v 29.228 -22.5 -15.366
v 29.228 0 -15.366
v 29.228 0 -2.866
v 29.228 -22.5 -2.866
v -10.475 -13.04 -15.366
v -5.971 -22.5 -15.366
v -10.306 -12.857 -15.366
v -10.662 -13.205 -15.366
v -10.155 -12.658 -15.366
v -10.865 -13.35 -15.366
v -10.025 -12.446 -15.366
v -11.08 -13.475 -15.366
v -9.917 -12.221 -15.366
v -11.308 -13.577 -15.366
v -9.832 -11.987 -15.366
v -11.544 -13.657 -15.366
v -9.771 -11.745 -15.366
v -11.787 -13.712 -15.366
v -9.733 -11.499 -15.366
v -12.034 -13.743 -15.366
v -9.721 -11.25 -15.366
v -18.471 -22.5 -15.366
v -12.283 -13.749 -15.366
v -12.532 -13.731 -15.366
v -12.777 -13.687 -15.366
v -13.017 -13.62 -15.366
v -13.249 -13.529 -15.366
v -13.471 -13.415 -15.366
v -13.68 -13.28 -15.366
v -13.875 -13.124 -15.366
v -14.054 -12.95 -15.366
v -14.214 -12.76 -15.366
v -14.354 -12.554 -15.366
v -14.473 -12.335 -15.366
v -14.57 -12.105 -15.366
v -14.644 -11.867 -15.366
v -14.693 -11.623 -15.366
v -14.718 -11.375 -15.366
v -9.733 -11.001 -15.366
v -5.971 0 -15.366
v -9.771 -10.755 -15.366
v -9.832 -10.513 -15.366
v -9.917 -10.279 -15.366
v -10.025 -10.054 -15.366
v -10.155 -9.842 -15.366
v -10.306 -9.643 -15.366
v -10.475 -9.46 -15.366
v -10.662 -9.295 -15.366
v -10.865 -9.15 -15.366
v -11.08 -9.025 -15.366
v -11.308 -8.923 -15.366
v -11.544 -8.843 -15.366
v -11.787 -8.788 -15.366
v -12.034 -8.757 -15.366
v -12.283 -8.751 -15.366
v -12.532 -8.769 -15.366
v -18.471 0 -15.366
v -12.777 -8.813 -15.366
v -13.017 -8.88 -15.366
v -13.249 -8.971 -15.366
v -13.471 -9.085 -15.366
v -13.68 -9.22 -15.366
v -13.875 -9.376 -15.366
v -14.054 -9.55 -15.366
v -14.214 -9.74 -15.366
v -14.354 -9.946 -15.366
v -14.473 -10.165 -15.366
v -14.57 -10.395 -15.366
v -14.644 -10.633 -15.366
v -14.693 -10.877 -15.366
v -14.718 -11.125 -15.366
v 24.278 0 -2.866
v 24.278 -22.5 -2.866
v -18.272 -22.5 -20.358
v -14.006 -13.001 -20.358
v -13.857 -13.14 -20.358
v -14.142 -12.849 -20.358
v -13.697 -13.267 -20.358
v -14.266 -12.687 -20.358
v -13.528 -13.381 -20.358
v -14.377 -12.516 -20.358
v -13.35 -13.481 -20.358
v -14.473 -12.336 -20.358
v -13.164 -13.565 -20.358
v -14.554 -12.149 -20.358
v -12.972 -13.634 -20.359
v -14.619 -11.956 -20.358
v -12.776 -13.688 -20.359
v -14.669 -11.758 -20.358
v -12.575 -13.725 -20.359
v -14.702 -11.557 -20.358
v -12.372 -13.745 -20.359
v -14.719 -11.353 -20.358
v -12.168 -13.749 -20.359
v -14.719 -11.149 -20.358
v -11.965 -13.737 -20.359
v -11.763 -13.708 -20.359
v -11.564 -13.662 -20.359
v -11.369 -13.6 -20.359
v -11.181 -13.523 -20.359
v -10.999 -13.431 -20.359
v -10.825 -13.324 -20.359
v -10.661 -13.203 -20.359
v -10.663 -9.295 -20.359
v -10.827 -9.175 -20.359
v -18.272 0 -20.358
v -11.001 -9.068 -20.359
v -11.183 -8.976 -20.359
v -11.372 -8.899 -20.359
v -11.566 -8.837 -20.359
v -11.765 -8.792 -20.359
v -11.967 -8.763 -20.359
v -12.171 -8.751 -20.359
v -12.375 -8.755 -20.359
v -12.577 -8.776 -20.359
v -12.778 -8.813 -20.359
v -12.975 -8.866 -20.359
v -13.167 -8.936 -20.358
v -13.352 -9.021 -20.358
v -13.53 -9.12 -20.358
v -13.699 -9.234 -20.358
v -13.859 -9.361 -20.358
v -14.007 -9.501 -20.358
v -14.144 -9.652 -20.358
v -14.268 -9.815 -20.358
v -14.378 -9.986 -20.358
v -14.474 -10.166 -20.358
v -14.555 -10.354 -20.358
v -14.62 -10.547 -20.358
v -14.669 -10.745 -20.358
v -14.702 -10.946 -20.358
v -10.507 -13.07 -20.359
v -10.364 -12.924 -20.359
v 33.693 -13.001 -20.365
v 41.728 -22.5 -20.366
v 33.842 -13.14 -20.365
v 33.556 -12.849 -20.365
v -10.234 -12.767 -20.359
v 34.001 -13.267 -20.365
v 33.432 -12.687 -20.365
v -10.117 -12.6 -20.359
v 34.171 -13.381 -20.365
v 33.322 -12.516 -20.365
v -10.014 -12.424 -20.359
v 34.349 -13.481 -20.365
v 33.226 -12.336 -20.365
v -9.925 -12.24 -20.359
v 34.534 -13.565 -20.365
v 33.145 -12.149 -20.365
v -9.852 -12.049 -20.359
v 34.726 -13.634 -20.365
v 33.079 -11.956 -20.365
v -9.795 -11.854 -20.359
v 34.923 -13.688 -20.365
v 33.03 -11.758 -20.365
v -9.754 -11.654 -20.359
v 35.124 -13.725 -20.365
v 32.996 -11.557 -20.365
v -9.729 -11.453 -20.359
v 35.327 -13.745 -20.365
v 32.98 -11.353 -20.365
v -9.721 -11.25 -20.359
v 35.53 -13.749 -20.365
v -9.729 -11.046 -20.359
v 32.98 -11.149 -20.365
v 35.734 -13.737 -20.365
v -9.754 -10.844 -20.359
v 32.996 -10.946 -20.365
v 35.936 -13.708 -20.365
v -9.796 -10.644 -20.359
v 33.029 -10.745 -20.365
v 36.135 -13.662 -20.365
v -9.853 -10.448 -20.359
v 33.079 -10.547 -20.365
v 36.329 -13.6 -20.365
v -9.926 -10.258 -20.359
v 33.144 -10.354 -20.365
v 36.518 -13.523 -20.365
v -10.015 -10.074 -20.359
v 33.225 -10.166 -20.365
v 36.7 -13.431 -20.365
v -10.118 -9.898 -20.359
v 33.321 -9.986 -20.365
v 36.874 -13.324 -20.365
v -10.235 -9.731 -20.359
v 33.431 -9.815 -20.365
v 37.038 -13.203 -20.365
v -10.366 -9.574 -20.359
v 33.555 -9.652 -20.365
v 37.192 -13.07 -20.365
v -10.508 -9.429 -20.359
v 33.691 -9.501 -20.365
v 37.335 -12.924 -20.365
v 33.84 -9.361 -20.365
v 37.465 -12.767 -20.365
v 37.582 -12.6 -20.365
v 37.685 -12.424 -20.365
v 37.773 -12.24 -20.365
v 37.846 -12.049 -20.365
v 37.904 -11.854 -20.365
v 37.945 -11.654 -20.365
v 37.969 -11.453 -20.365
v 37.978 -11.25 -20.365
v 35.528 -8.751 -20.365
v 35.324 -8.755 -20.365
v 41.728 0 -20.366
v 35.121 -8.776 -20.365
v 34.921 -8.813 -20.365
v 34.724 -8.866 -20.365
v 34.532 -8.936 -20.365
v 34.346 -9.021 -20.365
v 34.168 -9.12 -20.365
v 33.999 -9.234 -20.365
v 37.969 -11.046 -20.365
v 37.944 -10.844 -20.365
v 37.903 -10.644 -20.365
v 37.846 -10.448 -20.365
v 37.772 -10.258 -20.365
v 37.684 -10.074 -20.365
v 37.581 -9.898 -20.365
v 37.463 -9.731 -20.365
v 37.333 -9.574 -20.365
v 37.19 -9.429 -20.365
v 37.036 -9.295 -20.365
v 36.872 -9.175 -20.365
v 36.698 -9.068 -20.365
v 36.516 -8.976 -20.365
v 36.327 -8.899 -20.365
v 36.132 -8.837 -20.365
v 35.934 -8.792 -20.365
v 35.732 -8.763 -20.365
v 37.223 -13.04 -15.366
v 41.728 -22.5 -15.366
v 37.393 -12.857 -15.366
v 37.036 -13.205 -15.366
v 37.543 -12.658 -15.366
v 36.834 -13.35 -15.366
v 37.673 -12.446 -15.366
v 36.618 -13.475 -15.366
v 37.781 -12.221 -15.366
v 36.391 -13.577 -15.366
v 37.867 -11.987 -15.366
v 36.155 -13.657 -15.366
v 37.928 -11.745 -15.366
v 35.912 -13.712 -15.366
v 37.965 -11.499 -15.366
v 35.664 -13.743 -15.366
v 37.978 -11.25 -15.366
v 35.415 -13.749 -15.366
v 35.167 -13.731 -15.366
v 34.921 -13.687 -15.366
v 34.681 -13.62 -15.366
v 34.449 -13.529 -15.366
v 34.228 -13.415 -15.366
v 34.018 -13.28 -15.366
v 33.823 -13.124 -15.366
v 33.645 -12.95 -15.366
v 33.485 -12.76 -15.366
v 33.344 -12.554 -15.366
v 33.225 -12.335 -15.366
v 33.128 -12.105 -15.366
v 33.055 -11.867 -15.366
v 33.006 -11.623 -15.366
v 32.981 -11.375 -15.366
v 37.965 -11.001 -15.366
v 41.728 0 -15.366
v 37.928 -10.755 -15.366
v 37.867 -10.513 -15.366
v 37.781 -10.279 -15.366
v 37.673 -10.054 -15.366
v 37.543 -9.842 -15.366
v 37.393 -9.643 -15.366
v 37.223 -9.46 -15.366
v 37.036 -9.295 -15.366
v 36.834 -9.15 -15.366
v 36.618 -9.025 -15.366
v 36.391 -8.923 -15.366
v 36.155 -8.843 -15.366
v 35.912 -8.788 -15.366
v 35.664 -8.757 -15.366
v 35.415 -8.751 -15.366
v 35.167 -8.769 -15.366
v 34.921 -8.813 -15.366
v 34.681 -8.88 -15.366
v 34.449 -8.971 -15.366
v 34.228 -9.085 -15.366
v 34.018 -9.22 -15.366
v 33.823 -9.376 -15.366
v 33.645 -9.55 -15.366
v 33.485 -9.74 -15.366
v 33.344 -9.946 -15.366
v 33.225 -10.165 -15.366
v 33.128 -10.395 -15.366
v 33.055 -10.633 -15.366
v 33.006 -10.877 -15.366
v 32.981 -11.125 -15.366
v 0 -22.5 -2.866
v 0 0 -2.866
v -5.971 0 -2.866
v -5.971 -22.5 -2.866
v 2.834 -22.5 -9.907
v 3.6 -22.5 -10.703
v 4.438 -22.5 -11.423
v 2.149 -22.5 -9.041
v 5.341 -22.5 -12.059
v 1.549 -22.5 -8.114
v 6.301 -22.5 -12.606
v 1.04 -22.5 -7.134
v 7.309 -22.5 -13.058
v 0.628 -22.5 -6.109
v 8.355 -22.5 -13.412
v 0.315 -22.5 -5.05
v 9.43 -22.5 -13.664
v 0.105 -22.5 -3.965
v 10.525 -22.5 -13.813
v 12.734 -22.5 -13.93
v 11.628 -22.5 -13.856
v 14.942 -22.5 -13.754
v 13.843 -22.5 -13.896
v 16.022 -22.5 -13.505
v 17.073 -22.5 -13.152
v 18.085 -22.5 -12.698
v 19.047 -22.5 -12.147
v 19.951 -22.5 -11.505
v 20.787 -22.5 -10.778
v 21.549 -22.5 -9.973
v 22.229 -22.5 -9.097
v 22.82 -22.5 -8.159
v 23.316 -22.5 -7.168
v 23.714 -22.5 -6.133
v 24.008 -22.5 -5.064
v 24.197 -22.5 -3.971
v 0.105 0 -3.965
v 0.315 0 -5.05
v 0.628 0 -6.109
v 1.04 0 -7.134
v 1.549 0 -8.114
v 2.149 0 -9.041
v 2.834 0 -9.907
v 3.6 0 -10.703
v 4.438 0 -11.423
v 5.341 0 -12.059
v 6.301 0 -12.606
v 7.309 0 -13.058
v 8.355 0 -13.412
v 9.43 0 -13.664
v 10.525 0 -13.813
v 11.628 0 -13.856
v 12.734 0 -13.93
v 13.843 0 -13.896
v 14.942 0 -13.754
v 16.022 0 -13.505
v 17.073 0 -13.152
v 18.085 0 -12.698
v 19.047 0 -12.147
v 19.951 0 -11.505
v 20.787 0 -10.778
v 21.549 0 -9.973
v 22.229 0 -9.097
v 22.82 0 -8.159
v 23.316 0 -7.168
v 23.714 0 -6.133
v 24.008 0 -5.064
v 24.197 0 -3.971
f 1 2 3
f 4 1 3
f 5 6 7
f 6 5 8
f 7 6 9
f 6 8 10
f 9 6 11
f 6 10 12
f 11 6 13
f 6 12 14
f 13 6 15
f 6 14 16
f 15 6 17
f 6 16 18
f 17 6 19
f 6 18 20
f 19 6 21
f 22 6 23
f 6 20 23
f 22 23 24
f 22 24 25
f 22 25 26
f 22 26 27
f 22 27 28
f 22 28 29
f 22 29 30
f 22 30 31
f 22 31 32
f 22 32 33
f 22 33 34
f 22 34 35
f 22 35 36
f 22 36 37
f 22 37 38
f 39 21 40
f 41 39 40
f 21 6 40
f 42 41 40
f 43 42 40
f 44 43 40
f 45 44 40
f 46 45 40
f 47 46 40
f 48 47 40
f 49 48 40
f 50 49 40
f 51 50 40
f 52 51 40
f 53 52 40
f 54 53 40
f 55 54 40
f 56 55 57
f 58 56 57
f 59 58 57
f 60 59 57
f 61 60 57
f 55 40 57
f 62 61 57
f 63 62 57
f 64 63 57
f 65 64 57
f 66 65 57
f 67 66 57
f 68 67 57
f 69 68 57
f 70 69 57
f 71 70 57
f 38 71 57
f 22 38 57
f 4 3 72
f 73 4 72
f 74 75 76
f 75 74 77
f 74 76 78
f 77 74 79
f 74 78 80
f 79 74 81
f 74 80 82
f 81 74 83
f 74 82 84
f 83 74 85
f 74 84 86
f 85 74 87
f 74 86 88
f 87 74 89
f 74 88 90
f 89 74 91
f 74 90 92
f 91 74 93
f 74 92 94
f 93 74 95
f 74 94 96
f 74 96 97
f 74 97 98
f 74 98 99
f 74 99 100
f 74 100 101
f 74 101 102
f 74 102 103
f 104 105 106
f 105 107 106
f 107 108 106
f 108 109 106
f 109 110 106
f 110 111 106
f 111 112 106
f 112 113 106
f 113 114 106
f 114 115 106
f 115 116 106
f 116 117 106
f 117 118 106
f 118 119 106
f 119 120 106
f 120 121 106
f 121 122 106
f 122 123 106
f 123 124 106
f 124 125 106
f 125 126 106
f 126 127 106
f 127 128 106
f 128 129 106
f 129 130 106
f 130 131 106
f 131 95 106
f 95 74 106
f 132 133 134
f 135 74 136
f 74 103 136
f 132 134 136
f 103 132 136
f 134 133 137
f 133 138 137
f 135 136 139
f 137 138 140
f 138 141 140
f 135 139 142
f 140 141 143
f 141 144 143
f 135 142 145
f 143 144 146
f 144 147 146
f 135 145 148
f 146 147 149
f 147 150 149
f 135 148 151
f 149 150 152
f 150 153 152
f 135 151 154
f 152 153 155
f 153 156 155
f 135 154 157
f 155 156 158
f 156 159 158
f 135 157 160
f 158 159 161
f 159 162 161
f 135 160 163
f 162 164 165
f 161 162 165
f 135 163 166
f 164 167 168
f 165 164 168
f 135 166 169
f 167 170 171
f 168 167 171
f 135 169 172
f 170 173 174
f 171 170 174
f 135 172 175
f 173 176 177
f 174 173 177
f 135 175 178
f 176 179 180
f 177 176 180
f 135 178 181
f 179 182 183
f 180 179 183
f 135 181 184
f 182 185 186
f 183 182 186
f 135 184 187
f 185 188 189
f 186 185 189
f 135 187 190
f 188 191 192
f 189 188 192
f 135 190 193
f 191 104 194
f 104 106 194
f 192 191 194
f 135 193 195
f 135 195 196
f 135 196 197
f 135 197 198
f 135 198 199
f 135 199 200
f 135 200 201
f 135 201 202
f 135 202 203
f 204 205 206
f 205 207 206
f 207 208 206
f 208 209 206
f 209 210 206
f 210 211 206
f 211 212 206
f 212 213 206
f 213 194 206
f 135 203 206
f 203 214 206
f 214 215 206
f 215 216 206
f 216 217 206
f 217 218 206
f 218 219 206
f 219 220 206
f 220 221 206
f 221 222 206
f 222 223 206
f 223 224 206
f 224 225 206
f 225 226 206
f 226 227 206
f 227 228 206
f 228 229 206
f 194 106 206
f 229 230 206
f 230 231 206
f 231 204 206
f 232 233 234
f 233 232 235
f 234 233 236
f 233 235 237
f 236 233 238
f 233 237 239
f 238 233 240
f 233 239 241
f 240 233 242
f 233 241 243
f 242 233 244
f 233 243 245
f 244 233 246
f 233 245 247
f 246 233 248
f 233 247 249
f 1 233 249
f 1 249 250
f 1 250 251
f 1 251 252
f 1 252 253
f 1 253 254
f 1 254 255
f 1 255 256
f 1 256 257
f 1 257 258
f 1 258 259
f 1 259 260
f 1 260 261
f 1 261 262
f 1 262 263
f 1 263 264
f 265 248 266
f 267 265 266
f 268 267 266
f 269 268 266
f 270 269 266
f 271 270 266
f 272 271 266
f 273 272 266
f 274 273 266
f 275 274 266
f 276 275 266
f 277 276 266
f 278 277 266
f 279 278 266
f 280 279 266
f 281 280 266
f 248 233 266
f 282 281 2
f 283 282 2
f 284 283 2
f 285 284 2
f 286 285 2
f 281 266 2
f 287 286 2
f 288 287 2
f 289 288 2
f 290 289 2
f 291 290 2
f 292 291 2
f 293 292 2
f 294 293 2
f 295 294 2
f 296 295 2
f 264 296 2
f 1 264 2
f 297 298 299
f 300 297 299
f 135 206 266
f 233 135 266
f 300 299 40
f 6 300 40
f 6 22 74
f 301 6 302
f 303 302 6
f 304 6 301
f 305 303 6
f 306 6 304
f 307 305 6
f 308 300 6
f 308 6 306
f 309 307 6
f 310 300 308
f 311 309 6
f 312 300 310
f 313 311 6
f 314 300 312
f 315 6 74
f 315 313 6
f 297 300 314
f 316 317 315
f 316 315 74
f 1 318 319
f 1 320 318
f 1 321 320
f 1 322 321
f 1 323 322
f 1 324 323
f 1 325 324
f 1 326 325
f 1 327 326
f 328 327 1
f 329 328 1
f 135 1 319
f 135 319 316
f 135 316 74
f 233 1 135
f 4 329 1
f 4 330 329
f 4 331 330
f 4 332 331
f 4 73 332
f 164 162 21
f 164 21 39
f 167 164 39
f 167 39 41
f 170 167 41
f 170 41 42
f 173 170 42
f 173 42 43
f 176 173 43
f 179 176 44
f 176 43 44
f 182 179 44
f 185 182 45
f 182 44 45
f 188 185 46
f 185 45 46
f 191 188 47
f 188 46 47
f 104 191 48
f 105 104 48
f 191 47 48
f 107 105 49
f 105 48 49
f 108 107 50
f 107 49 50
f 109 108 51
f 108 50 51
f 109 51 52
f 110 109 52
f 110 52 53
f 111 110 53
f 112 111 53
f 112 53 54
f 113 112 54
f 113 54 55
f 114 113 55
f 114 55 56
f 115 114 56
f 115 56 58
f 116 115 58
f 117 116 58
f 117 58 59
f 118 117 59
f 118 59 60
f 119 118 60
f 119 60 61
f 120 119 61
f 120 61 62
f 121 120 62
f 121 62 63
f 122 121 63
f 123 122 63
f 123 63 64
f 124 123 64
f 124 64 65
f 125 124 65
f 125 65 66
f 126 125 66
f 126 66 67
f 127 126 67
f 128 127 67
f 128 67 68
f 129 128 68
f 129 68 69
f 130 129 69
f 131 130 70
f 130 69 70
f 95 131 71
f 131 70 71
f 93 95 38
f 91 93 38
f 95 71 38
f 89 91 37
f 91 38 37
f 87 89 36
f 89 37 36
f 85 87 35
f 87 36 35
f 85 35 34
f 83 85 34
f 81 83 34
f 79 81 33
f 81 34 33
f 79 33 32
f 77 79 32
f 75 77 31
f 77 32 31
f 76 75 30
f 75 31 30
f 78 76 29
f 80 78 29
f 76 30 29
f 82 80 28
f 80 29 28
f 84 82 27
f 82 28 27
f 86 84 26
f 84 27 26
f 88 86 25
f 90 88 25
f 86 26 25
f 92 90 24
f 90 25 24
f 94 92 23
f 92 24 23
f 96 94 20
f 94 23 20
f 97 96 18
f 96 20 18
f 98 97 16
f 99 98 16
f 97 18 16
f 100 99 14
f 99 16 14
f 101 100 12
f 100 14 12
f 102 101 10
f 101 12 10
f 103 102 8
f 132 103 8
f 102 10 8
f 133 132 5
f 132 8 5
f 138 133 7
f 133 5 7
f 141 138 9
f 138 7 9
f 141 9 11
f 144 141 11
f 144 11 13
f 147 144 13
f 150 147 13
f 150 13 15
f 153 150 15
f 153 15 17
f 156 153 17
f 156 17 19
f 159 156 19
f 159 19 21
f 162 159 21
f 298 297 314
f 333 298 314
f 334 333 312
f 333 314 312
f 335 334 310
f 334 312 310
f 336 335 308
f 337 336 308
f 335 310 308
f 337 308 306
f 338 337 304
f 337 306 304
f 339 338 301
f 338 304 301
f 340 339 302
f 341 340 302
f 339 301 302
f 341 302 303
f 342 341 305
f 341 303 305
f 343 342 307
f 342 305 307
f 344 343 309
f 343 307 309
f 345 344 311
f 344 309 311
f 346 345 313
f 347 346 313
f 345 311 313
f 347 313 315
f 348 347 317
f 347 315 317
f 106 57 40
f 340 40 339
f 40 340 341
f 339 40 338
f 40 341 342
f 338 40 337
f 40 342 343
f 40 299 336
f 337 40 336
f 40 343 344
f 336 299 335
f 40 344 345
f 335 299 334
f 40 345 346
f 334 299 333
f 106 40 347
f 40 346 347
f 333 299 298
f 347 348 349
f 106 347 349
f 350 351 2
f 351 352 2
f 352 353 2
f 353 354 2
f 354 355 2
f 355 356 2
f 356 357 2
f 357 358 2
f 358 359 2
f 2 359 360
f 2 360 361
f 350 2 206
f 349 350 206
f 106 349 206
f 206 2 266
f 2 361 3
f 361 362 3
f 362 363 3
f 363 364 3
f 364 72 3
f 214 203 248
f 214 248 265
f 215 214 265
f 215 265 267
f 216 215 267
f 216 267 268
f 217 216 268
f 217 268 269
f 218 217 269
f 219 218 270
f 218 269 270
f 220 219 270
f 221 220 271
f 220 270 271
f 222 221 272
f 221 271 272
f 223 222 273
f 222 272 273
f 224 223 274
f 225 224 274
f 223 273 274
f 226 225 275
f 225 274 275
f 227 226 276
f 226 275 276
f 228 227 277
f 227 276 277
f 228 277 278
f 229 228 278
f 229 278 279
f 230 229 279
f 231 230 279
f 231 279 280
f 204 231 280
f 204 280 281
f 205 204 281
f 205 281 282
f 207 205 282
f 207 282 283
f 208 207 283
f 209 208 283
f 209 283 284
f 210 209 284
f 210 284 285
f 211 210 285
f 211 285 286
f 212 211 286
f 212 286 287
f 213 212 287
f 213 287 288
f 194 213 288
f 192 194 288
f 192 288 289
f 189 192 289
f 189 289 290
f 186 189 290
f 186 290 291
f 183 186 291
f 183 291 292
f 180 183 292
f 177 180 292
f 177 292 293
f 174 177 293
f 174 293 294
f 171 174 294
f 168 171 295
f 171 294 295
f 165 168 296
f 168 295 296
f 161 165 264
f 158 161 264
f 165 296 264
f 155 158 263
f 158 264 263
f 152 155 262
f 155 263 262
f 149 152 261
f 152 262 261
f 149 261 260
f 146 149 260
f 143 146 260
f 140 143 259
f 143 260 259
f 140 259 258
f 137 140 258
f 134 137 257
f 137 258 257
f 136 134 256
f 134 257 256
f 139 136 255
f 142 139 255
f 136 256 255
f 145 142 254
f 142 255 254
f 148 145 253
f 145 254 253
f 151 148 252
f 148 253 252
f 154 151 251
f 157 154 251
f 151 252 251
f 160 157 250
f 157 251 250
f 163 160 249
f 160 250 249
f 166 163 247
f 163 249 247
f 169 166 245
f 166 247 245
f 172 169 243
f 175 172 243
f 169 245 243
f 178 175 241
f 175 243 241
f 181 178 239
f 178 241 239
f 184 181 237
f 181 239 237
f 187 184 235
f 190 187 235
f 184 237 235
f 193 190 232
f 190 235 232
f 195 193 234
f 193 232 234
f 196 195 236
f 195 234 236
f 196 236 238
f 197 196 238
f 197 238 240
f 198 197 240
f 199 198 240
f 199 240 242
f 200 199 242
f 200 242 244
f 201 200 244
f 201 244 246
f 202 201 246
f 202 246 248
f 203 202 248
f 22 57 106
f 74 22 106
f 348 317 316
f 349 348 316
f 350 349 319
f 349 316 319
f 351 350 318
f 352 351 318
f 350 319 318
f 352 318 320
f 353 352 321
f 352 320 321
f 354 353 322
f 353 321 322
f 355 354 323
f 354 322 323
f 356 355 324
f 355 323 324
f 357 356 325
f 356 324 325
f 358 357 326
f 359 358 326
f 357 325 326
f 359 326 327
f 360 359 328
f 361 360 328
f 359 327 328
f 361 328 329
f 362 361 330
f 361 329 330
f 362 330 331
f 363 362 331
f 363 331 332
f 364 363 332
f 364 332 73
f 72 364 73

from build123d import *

# Parameters (mm, degrees)
F1_DEPTH = 22.5
F2_R     = 2.5
F3_DEPTH = 5.001
F4_R     = 2.5
F5_DEPTH = 5.001
F7_DEPTH = 22.501


with BuildPart() as f1:
    # F0 (on Front) → F1 (new body)
    with BuildSketch(Plane.XZ):
        Polygon((-18.470997, -15.365735), (-18.272383, -20.357819), (41.727616, -20.365735), (41.727616, -15.365735), (29.227616, -15.365735), (29.227616, -2.865735), (-5.970997, -2.865735), (-5.970997, -15.365735), align=None)
    extrude(amount=F1_DEPTH)

    # F2 (on face) → F3 (cut, through all)
    with BuildSketch(Plane.XY.offset(-15.365735)):
        with Locations((35.477616, -11.25)):
            Circle(F2_R)
    extrude(amount=-F3_DEPTH, mode=Mode.SUBTRACT)

    # F4 (on face) → F5 (cut, through all)
    with BuildSketch(Plane.XY.offset(-15.365735)):
        with Locations((-12.220997, -11.25)):
            Circle(F4_R)
    extrude(amount=-F5_DEPTH, mode=Mode.SUBTRACT)

    # F6 (on face) → F7 (cut, through all)
    with BuildSketch(Plane.XZ.offset(22.5)):
        with BuildLine():
            ThreePointArc((0, -2.865735), (3.599998, -10.703488), (11.62831, -13.855716))
            ThreePointArc((11.62831, -13.855716), (20.377936, -11.151829), (24.277631, -2.865735))
            Line((24.277631, -2.865735), (11.62831, -2.865735))
            Line((11.62831, -2.865735), (0, -2.865735))
        make_face()
    extrude(amount=-F7_DEPTH, mode=Mode.SUBTRACT)


solid = f1.part
